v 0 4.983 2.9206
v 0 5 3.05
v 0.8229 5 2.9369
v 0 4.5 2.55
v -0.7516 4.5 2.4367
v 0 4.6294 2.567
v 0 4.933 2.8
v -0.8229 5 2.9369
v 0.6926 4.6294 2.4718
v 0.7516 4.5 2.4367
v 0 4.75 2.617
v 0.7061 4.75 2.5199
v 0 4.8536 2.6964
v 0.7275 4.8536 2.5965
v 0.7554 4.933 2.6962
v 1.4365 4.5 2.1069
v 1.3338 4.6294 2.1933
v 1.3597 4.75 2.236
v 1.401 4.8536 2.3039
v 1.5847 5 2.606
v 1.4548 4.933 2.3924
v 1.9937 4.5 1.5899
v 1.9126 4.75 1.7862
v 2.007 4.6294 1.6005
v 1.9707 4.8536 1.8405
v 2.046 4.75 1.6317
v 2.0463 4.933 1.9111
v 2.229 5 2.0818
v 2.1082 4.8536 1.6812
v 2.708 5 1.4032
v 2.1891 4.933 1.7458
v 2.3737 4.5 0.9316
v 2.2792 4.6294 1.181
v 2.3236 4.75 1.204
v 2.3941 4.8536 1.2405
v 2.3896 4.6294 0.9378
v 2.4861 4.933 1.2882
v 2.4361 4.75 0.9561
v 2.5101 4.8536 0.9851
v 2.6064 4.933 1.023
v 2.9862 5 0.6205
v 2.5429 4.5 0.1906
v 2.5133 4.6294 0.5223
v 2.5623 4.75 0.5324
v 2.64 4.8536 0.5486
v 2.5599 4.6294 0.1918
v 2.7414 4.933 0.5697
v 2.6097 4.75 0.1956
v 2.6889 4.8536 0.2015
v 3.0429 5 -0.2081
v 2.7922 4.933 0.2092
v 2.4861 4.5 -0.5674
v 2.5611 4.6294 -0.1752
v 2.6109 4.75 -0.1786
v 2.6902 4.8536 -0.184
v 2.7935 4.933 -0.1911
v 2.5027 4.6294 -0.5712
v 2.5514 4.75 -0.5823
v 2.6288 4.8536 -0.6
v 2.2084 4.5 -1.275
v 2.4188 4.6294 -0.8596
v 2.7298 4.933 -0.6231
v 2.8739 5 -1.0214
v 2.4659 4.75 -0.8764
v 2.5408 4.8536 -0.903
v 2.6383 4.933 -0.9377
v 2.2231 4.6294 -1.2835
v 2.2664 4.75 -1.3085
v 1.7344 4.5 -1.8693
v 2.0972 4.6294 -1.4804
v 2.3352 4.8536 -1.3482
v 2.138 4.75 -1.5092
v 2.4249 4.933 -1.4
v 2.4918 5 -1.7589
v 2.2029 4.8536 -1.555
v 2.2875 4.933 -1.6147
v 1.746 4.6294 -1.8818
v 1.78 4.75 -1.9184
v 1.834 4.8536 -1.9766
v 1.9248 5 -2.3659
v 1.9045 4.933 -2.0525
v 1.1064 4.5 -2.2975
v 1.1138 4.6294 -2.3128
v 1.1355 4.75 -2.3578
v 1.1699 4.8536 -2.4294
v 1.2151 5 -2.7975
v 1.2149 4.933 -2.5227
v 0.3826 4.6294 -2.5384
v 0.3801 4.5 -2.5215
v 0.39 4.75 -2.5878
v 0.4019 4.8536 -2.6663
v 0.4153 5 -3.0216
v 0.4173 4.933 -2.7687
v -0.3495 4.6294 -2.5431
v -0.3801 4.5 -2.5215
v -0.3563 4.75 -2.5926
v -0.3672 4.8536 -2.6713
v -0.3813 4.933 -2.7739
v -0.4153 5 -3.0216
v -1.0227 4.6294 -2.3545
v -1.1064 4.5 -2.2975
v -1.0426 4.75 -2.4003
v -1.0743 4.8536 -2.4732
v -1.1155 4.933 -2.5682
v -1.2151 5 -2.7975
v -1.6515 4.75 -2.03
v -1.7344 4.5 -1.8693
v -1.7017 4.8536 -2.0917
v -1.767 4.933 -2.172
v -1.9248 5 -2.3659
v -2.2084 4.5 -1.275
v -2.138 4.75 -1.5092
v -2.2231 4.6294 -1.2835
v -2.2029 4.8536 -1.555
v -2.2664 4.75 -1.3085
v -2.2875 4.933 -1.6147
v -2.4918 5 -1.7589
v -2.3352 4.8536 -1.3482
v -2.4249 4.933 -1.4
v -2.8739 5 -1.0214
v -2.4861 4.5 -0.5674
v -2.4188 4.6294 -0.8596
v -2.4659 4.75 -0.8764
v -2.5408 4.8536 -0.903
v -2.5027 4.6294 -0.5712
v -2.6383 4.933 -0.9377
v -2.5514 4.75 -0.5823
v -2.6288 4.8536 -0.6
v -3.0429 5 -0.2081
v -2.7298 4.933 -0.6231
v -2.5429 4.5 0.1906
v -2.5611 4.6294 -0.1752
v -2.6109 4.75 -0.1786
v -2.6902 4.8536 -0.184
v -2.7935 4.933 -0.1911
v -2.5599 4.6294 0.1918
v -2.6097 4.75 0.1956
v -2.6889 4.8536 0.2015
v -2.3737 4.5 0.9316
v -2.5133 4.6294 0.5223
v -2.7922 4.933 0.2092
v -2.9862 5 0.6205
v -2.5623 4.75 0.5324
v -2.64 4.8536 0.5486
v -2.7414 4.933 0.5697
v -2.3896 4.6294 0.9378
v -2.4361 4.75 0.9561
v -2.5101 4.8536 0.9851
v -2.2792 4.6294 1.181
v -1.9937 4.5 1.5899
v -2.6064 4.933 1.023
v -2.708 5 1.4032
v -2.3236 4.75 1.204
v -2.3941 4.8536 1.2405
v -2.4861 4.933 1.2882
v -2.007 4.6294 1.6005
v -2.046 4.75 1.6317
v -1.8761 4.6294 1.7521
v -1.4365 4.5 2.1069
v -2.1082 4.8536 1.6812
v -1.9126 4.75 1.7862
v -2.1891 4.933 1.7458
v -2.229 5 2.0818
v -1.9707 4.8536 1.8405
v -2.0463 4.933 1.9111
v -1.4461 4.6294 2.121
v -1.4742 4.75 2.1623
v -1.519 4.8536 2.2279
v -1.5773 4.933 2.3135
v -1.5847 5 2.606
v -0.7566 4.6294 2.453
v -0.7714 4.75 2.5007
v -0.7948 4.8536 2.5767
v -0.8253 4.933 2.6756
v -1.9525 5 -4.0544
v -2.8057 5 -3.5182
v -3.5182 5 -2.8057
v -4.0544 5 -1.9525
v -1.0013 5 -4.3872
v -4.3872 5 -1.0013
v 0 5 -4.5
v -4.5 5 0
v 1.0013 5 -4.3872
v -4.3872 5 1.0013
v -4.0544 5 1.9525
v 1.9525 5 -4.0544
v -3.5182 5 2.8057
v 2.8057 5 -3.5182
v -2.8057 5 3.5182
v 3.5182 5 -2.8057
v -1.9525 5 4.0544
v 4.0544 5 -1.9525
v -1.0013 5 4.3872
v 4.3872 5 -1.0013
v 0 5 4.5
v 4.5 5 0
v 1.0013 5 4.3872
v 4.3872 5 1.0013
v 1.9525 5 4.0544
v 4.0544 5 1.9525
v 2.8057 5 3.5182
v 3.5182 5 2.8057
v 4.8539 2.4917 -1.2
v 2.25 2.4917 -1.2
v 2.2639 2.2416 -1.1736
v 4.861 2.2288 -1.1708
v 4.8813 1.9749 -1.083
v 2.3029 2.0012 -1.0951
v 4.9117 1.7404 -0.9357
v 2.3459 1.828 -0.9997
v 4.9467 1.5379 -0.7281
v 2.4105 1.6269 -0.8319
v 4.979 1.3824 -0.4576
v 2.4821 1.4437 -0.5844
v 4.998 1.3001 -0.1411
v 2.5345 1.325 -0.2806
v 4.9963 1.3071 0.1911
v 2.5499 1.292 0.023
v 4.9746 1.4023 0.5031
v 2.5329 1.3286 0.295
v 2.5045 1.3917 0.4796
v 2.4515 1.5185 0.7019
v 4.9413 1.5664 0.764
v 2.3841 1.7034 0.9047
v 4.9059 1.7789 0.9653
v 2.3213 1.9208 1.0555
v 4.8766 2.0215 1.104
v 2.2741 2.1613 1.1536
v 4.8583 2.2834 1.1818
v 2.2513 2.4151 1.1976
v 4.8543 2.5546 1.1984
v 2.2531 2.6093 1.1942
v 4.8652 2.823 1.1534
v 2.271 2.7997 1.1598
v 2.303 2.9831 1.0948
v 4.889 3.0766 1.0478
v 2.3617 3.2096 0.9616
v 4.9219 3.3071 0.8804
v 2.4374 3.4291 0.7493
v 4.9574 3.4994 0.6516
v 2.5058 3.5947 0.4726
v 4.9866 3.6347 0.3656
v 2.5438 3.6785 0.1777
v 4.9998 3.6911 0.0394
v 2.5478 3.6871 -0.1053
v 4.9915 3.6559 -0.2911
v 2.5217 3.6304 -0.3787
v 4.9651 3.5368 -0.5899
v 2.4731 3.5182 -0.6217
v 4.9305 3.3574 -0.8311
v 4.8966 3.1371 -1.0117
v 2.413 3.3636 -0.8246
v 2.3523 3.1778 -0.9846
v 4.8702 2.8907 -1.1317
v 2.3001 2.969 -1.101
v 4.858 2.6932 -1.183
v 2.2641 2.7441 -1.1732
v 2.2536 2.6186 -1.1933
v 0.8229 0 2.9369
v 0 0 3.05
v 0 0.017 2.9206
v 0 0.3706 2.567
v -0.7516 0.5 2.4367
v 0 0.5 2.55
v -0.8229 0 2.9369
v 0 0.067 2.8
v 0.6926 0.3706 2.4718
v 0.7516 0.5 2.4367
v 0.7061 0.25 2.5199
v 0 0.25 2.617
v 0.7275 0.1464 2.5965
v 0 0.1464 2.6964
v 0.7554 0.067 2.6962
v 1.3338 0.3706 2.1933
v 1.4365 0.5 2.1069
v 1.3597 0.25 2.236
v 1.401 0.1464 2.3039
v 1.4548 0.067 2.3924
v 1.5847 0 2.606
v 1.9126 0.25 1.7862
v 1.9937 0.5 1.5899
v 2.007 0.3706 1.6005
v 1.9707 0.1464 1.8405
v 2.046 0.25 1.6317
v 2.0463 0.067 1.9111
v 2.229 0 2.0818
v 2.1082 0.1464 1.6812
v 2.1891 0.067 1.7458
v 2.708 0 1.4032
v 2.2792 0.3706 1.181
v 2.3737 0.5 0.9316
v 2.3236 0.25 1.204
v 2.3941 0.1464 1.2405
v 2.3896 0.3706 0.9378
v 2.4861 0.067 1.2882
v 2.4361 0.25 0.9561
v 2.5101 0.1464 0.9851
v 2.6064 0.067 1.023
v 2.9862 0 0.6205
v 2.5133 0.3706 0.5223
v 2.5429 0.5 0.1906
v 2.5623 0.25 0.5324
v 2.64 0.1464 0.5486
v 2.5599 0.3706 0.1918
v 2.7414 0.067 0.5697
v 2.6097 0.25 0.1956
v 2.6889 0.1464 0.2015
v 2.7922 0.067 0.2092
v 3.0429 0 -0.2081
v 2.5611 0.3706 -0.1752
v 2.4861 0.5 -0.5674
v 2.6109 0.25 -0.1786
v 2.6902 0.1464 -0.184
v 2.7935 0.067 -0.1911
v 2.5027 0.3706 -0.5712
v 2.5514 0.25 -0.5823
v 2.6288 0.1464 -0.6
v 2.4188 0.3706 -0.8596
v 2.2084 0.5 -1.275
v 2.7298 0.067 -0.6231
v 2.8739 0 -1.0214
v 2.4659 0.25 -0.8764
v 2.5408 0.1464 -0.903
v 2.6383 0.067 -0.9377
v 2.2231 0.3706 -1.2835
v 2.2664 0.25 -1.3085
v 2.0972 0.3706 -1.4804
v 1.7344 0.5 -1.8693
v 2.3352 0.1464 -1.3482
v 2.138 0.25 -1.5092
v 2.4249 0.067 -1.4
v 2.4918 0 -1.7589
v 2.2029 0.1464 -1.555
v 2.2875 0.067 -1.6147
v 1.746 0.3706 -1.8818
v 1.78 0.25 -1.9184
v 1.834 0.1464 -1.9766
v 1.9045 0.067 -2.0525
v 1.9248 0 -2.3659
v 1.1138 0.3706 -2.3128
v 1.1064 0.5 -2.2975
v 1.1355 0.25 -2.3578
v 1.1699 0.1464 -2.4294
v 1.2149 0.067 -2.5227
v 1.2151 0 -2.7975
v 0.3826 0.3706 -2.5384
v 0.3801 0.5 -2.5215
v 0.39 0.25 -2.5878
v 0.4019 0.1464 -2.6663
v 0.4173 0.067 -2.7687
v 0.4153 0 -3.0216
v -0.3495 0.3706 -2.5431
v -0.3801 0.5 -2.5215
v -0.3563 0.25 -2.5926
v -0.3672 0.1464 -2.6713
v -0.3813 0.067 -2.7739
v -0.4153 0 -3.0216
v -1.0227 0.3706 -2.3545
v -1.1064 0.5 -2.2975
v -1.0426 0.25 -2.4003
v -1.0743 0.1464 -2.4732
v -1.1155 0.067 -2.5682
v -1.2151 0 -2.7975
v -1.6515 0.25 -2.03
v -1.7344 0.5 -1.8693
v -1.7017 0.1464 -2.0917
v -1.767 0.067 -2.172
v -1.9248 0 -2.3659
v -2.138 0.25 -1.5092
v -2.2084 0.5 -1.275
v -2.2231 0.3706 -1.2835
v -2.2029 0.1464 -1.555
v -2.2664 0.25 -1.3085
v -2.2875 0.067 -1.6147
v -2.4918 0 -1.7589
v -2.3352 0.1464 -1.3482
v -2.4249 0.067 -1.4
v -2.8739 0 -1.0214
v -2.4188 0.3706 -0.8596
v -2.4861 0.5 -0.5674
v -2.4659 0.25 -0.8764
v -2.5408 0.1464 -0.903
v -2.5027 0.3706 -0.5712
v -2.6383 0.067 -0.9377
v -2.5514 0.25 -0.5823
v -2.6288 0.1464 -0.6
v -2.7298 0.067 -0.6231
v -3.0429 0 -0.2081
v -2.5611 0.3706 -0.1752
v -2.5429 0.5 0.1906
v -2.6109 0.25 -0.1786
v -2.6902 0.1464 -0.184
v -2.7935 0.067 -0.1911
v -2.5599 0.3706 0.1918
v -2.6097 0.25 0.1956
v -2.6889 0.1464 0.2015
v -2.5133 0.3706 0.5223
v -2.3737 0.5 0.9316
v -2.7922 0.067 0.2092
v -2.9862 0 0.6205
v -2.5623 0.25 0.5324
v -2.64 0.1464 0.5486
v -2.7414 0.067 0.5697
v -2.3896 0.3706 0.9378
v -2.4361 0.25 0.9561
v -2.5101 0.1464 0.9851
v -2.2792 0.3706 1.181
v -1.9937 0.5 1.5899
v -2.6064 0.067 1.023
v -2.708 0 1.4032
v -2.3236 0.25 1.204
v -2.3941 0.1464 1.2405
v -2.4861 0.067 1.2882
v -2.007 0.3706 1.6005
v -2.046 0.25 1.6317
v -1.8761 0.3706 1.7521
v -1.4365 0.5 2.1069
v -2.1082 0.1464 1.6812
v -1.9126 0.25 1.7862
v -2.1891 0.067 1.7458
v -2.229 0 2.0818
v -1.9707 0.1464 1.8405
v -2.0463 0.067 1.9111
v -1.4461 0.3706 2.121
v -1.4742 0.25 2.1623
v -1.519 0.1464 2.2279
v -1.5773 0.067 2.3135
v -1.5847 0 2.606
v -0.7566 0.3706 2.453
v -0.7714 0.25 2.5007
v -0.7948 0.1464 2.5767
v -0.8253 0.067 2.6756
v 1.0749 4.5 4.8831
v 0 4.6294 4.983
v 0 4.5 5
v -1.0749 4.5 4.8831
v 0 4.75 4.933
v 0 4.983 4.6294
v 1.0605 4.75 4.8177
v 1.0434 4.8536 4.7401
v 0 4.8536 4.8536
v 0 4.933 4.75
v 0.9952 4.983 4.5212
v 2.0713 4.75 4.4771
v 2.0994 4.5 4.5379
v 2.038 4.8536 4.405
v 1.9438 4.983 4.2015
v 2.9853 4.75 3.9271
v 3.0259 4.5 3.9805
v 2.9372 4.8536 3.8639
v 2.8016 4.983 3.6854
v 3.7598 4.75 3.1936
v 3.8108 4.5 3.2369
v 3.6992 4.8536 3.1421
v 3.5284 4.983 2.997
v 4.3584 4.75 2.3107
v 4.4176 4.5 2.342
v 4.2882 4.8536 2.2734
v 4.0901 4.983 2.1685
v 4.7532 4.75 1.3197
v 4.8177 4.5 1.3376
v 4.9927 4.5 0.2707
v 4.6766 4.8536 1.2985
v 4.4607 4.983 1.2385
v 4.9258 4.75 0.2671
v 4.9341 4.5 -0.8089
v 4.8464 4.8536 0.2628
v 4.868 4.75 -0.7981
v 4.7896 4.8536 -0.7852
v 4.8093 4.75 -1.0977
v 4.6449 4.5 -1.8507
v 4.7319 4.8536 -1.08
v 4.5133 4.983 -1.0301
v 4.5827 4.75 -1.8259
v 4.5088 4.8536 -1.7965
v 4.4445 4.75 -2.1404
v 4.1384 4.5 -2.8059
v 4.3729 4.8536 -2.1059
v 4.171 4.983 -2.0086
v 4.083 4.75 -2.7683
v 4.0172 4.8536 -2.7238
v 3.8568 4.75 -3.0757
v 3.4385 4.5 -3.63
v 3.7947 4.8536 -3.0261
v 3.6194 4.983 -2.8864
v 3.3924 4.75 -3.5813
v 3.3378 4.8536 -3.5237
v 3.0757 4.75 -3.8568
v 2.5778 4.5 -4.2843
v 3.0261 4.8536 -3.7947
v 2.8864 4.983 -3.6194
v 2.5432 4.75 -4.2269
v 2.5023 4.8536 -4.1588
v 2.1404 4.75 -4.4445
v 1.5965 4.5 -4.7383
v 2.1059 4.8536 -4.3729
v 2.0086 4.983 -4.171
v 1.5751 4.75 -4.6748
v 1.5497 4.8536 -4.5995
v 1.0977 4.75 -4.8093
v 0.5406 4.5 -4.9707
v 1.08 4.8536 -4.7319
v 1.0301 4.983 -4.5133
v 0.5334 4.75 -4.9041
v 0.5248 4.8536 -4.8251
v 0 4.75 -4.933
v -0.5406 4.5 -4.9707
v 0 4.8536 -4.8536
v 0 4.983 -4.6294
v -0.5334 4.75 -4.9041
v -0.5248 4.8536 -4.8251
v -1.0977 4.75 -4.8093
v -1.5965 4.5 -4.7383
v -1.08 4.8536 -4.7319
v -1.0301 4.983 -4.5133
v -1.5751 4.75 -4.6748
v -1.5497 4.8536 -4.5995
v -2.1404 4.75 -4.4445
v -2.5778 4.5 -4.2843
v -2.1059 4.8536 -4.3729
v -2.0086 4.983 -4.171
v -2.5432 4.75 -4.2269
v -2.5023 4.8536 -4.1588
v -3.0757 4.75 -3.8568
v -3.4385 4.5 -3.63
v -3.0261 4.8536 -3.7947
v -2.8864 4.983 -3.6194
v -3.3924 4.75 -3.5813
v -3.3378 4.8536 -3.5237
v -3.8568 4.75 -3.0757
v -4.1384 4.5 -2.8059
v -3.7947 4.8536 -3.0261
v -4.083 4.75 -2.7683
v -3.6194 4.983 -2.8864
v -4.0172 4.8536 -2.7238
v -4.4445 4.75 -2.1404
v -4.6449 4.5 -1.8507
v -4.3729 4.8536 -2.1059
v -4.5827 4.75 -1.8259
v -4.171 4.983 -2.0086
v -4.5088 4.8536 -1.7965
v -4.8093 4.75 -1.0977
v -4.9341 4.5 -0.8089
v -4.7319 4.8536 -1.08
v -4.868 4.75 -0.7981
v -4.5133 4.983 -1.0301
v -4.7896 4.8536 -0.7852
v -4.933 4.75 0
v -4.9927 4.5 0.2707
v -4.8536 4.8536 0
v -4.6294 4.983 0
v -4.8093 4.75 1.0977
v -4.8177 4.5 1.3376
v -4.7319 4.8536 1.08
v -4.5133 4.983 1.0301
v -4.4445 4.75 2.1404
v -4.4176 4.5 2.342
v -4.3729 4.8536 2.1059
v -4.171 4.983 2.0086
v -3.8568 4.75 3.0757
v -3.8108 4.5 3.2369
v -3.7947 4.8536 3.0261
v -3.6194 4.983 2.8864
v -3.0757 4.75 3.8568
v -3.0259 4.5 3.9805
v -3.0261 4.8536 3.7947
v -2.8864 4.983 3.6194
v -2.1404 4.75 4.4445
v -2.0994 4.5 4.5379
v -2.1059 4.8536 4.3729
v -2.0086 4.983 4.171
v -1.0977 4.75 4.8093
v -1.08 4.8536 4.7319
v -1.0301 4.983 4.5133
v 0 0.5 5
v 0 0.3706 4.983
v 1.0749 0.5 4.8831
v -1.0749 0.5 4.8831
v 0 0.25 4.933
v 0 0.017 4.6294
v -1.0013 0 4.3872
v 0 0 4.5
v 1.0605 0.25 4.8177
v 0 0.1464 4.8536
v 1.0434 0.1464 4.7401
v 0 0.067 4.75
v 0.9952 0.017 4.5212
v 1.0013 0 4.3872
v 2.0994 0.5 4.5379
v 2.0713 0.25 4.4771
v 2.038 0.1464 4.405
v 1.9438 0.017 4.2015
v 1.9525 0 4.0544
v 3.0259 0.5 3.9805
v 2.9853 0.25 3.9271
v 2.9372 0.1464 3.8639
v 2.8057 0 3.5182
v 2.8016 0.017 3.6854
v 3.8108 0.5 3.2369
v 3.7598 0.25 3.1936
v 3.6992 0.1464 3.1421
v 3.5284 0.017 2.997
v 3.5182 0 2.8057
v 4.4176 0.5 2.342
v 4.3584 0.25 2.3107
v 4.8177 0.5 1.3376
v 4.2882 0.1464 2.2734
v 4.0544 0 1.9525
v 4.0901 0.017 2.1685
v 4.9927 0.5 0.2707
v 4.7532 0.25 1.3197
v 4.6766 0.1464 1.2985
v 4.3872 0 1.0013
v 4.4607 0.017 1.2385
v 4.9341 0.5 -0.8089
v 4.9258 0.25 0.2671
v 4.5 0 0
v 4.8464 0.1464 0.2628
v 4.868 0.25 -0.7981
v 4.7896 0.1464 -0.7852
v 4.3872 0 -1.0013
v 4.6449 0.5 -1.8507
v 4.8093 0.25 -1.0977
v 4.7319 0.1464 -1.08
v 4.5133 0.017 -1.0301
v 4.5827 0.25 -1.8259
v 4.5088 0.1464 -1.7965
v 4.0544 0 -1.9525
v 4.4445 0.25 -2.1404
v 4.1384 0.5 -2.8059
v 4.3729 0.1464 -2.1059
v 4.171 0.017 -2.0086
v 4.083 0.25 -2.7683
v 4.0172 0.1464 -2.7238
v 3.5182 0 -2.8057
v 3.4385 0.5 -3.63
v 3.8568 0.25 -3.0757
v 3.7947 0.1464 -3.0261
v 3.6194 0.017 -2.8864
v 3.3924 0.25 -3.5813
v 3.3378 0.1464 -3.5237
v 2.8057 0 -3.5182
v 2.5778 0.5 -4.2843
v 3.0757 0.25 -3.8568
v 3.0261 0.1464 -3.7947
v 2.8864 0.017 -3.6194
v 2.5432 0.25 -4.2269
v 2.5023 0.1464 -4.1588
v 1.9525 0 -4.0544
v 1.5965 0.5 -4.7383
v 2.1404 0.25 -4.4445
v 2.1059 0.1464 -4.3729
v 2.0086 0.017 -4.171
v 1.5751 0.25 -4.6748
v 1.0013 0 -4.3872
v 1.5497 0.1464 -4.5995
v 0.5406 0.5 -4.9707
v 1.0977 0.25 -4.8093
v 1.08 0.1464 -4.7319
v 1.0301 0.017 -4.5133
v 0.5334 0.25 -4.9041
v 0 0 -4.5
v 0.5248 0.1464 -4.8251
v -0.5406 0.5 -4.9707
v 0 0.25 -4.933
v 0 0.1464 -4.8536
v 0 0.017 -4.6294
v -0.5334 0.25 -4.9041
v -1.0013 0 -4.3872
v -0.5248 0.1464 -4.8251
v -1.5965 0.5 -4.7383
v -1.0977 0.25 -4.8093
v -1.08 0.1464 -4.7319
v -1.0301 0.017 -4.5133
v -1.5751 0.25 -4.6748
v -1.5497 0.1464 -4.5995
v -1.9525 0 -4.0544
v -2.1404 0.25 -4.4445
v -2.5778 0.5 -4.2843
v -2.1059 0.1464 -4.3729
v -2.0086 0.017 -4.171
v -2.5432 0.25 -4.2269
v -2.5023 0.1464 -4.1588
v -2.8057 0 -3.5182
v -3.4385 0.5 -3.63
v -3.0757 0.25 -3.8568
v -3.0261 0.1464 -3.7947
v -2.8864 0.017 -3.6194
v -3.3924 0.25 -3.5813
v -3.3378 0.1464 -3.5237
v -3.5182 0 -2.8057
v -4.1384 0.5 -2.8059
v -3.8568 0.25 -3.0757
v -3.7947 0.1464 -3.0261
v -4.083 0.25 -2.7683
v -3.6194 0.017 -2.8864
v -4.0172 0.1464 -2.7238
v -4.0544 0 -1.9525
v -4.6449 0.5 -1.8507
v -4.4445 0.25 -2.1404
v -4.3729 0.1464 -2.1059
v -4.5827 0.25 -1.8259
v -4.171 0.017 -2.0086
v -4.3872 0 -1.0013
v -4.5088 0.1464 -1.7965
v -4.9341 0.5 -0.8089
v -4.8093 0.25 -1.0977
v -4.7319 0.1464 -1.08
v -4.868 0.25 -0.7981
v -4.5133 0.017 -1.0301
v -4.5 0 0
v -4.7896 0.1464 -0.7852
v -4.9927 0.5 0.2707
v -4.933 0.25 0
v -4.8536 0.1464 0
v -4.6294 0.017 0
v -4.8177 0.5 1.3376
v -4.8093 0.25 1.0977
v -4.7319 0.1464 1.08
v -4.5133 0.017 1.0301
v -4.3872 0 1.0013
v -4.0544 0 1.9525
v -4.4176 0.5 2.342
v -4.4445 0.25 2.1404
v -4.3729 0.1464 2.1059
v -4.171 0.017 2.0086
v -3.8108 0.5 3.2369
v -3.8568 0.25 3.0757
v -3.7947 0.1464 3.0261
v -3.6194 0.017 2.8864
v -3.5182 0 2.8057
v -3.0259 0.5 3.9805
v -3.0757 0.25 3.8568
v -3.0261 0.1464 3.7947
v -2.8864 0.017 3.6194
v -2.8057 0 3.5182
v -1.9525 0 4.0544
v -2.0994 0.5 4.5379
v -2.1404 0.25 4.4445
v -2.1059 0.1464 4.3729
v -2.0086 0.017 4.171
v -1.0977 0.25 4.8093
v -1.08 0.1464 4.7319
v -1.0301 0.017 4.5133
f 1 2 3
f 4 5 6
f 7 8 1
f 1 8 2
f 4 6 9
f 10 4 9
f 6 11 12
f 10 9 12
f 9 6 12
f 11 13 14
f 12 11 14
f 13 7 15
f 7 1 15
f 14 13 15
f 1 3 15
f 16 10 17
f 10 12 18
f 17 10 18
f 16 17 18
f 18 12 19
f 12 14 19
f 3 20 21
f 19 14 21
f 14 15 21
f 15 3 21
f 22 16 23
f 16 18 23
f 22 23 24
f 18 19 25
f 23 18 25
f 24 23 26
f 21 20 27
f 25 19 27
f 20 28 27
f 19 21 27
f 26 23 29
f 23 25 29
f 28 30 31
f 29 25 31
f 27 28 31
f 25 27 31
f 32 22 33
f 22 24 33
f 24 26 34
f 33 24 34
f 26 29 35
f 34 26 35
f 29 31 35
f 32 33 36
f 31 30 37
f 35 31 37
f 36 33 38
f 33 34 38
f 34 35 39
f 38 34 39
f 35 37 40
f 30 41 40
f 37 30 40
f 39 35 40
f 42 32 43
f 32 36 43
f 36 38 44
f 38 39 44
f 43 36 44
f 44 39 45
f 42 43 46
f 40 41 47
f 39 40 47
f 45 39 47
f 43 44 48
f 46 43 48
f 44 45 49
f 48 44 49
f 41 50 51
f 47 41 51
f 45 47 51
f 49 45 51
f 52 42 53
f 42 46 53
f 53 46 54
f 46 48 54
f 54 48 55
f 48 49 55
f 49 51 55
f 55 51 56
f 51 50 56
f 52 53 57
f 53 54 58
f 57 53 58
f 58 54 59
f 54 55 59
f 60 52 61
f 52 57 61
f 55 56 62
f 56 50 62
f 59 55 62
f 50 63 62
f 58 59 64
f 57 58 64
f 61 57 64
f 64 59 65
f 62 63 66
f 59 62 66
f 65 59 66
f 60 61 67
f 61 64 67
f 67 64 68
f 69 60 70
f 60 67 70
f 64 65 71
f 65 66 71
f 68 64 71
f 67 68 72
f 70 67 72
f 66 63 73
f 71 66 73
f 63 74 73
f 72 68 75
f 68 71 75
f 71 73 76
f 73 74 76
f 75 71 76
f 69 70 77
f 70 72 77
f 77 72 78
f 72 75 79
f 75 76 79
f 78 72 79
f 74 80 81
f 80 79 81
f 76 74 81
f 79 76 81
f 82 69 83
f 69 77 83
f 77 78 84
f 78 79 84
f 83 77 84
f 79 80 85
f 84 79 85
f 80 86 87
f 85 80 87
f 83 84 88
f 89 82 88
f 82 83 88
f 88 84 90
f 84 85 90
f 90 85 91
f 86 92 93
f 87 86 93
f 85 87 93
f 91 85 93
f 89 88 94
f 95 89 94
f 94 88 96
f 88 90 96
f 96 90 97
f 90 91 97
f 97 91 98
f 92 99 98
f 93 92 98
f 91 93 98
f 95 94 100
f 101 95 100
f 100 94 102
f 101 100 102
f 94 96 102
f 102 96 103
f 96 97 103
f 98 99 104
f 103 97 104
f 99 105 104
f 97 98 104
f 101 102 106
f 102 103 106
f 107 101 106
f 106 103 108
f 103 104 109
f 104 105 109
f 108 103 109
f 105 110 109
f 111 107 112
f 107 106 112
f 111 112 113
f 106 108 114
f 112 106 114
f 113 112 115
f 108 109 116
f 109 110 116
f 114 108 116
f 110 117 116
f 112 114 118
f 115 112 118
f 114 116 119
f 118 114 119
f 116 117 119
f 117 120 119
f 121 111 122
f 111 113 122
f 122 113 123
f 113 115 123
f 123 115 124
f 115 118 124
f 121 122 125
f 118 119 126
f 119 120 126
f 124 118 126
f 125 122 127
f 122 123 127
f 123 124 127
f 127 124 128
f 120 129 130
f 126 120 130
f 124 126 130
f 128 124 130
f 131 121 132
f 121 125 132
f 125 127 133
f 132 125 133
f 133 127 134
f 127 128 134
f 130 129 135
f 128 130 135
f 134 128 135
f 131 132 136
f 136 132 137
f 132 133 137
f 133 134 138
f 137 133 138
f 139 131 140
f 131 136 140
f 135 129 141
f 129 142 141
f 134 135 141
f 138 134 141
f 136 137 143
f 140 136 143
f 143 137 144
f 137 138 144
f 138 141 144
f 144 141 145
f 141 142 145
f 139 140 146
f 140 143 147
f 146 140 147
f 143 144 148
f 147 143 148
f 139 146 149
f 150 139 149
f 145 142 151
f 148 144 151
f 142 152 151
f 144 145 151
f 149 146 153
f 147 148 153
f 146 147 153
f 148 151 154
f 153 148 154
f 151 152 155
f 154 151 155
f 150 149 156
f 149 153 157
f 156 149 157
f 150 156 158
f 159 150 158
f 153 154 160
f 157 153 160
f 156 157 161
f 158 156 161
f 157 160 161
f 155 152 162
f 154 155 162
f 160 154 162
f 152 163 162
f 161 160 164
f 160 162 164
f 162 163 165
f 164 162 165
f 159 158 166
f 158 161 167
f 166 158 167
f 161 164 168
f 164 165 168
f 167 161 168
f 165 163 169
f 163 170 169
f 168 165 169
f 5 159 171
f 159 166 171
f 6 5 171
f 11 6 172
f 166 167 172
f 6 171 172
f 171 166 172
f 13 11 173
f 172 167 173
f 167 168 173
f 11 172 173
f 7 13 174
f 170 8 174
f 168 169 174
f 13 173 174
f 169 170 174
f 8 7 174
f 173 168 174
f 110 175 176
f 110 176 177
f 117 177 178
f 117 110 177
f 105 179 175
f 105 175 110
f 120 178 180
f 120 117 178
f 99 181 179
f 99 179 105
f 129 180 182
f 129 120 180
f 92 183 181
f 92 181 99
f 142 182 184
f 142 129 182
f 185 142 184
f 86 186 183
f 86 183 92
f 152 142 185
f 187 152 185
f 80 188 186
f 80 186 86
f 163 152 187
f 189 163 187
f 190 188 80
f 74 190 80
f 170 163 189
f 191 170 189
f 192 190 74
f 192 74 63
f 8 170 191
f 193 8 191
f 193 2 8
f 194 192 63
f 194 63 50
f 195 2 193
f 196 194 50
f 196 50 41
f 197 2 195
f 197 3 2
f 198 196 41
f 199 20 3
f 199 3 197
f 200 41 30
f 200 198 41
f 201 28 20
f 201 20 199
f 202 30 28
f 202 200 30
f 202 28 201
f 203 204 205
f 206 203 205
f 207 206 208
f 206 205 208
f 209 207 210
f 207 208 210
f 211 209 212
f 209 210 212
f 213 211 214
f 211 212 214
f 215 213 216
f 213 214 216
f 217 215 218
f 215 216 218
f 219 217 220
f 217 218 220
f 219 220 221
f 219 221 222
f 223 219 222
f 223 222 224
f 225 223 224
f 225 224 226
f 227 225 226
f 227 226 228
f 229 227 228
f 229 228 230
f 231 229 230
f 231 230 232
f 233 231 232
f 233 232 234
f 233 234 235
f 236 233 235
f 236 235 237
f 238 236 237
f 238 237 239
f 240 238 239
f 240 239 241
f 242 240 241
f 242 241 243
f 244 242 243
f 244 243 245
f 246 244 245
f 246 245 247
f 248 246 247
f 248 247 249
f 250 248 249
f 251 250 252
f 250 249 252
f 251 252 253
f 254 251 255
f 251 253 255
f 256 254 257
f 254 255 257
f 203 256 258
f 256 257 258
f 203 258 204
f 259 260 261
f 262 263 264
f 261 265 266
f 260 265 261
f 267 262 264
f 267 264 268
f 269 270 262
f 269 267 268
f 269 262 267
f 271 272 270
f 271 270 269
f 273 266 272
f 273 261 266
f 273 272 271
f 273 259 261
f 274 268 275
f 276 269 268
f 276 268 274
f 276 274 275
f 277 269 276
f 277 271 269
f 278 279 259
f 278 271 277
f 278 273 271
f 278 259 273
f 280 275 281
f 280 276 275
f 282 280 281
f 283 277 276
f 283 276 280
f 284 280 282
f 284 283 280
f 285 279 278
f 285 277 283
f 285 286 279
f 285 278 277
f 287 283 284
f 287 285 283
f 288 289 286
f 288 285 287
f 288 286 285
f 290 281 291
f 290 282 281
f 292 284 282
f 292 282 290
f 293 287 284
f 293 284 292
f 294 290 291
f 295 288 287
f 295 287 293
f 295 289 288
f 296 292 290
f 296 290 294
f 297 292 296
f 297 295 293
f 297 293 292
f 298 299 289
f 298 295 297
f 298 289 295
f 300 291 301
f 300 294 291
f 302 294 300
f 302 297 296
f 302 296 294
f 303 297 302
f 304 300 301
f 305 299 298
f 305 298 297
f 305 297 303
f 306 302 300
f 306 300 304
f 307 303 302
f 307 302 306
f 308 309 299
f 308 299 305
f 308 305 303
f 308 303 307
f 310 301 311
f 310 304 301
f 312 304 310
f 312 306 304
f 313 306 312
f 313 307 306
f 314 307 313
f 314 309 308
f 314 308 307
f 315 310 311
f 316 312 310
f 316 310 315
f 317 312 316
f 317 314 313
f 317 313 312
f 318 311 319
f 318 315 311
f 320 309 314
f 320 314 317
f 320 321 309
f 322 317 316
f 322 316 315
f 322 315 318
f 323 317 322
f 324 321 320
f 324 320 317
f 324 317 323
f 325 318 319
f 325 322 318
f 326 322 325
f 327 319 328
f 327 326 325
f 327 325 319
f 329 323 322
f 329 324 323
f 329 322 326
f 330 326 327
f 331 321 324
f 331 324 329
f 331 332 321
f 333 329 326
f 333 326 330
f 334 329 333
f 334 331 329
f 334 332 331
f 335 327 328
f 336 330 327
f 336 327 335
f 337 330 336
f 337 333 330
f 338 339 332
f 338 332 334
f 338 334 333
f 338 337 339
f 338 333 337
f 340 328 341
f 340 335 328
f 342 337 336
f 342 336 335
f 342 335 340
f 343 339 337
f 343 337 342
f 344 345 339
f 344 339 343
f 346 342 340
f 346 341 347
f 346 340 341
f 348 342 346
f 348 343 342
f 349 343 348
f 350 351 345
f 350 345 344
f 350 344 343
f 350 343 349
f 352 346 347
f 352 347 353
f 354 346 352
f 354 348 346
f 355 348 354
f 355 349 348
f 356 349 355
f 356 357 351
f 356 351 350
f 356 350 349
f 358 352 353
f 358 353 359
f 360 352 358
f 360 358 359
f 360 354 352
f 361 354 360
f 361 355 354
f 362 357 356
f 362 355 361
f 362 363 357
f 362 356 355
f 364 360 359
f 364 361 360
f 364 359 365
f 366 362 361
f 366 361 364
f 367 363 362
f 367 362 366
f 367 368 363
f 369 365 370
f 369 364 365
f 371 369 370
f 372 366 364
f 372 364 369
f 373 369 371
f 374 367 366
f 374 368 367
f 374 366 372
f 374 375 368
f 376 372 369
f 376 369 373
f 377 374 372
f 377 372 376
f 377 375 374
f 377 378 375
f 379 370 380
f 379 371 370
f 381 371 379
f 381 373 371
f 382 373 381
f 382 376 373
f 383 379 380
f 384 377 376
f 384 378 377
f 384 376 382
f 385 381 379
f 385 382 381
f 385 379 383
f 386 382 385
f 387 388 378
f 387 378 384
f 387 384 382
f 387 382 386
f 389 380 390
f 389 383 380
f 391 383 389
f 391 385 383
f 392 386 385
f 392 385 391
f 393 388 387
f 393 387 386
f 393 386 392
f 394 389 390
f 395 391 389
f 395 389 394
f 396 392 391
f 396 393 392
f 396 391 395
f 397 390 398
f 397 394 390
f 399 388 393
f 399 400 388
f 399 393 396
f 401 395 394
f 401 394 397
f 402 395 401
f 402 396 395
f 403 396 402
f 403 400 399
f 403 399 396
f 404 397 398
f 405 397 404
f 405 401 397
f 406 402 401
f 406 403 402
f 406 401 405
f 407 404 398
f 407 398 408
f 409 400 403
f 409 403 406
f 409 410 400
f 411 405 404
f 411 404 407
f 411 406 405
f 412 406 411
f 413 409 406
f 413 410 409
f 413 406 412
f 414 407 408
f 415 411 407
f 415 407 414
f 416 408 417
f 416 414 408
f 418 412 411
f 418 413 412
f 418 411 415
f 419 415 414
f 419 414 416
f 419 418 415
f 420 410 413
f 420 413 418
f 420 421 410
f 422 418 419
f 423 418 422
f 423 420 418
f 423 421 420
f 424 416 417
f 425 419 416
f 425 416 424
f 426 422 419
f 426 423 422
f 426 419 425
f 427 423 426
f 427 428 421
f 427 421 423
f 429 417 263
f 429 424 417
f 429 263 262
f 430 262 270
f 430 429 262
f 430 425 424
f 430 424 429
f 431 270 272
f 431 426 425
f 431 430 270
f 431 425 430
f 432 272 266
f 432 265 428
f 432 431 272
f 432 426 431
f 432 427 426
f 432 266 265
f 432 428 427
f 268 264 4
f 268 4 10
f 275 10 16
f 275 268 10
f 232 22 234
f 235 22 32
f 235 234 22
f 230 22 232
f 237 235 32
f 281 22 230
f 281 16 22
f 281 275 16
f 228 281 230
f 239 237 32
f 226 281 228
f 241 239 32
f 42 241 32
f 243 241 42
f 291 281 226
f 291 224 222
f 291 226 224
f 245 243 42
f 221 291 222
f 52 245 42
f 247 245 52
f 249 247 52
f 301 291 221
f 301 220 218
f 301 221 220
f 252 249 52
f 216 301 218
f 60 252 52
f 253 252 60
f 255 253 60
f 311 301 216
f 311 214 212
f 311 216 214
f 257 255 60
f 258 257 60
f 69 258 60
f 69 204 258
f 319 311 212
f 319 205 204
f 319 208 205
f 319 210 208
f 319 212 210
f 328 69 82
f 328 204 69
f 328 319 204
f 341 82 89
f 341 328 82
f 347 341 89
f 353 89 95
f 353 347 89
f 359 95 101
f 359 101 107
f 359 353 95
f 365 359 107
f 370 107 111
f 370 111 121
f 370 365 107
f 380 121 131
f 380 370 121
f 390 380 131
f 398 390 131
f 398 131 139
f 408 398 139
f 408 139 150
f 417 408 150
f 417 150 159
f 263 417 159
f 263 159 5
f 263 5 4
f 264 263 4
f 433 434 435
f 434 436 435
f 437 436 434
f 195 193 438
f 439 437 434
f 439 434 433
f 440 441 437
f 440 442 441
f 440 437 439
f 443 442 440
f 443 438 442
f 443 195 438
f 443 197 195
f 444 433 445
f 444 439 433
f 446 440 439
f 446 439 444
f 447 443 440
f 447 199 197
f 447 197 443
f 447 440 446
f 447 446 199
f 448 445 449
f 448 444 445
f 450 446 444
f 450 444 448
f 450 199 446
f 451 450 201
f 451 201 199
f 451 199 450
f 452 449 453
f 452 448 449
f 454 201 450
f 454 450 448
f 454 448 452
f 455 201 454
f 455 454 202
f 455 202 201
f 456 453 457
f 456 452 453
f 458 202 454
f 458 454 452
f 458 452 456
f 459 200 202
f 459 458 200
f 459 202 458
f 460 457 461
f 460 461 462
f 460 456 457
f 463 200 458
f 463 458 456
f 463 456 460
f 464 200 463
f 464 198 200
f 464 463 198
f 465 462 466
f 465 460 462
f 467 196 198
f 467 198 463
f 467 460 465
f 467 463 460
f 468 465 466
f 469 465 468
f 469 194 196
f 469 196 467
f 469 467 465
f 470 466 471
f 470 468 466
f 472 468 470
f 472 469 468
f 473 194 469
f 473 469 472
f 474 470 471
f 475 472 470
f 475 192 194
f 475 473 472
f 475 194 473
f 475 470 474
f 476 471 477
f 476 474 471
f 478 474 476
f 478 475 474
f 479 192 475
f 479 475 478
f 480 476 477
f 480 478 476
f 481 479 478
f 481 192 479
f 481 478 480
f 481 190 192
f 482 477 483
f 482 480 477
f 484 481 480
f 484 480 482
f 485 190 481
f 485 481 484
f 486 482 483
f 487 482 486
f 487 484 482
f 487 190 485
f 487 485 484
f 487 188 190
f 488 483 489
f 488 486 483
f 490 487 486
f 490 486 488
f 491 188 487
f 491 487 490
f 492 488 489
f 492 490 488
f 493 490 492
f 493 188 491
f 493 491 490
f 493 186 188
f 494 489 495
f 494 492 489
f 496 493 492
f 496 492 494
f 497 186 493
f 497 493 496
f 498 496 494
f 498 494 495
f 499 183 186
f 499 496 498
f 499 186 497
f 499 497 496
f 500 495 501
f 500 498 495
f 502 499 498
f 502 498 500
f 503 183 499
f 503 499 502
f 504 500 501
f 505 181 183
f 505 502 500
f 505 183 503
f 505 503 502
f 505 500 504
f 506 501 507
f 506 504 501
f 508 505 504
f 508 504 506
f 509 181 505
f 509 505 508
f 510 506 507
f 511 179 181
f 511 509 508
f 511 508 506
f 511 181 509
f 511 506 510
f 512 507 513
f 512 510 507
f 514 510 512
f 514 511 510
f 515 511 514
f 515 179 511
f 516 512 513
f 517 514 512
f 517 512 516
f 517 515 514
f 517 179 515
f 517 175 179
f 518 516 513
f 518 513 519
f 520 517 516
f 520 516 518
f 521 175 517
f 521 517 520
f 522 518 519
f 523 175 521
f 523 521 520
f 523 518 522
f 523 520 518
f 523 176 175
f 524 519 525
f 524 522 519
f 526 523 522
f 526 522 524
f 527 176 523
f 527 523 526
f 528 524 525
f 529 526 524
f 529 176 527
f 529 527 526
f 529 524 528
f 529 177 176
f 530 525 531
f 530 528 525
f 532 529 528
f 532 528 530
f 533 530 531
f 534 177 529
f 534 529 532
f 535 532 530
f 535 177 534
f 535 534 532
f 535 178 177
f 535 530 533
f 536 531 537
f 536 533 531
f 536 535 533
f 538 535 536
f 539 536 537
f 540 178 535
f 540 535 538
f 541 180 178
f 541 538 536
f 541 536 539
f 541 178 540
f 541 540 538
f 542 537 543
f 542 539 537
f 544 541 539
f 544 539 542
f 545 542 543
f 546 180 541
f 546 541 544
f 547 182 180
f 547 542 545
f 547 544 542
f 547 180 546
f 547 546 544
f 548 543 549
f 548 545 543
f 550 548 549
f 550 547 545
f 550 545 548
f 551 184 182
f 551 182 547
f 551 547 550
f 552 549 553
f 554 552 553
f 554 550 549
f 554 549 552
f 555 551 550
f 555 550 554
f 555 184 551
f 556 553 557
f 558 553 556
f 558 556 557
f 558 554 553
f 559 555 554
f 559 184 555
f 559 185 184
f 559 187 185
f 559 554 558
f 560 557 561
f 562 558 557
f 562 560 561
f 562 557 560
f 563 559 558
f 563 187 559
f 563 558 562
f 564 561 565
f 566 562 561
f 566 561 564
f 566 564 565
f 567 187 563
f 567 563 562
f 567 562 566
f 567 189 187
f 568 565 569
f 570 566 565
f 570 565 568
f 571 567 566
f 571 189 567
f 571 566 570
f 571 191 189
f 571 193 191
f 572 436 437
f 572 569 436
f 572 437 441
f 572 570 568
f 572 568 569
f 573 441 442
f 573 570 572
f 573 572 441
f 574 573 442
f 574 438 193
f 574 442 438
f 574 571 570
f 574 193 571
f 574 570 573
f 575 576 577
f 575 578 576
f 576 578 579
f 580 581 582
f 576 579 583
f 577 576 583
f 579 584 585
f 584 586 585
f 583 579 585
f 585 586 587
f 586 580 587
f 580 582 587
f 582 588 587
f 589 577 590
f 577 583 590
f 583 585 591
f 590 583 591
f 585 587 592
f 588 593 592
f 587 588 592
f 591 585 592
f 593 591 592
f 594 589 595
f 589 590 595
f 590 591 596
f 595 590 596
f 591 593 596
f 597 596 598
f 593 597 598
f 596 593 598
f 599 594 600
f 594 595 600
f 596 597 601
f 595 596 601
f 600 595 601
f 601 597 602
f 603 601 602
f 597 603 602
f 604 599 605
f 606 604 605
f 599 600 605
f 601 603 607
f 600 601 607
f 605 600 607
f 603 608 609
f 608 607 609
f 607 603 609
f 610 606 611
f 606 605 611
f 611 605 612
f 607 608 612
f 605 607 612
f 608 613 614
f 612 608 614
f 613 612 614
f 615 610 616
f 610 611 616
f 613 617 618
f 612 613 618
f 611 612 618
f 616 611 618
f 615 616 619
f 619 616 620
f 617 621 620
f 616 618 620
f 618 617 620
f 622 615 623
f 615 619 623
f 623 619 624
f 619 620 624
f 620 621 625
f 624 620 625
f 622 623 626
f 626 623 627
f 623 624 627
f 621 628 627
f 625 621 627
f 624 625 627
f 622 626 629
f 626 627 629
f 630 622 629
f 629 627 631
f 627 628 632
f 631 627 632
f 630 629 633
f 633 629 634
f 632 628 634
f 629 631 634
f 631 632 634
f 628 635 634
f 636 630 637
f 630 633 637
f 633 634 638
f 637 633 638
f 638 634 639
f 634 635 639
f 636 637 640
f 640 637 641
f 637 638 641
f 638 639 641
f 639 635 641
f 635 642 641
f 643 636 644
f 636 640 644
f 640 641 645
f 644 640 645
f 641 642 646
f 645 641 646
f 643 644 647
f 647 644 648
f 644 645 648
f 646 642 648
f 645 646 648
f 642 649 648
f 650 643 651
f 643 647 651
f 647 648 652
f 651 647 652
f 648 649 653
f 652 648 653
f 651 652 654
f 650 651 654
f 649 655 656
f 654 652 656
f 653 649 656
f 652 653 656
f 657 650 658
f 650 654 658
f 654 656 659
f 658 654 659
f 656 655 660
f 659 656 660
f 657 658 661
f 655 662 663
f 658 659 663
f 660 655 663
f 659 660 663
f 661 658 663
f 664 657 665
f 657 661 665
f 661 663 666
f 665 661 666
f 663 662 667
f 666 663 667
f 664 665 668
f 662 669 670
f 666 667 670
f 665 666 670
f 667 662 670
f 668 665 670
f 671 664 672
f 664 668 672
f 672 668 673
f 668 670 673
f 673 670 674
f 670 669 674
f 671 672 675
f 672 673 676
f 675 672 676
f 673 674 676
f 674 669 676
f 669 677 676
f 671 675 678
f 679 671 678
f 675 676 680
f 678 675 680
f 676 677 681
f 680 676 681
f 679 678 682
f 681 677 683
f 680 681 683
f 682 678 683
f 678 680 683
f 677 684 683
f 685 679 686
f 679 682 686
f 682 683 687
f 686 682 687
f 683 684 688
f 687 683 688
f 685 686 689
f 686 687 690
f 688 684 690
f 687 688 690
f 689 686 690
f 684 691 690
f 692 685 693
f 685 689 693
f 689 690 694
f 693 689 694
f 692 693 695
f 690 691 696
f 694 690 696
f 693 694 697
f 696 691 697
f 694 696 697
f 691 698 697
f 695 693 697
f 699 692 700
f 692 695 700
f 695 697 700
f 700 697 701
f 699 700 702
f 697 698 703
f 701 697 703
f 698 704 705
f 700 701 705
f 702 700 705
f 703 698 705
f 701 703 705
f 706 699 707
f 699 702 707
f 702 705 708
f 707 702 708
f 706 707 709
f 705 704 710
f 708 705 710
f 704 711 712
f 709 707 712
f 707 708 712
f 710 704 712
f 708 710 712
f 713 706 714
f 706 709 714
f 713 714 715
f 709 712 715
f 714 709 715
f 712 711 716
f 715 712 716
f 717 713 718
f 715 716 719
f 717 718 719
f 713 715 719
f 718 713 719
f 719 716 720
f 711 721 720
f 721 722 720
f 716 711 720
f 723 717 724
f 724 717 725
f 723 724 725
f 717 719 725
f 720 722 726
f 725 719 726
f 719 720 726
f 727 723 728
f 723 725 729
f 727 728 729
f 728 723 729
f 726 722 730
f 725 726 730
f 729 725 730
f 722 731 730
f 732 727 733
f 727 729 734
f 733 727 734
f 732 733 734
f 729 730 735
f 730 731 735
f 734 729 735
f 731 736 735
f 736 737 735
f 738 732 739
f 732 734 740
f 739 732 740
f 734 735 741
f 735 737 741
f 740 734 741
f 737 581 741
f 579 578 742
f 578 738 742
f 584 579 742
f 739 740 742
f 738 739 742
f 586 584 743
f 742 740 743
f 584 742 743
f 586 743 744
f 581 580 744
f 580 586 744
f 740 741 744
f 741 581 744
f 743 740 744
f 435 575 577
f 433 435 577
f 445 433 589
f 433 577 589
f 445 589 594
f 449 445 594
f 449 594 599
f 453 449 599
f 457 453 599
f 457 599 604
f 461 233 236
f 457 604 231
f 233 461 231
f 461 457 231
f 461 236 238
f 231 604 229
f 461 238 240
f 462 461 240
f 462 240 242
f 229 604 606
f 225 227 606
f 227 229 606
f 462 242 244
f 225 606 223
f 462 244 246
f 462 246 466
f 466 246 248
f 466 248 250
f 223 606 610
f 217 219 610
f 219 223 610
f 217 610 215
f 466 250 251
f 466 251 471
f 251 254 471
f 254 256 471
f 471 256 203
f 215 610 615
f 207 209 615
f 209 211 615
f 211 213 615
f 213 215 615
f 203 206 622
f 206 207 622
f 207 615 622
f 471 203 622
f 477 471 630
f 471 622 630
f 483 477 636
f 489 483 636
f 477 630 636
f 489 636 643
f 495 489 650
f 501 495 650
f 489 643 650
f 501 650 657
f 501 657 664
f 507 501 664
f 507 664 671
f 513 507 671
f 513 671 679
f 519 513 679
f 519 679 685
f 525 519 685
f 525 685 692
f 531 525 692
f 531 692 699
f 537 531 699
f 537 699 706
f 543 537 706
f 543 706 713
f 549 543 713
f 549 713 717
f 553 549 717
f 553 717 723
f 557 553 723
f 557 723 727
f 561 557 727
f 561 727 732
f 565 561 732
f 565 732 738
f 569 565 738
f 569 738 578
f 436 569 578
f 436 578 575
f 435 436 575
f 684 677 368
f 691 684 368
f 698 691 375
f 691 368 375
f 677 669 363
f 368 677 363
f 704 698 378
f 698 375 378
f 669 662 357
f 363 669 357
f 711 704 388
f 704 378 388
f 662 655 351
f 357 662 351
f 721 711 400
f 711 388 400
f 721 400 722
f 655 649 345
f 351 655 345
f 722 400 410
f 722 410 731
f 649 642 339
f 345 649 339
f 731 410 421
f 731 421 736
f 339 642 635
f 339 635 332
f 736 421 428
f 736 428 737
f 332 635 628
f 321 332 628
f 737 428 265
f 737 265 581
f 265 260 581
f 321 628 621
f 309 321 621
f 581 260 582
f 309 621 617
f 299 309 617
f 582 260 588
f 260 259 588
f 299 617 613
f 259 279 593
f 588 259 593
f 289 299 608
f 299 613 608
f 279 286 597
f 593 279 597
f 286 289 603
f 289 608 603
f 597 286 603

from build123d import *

# Parameters (mm, degrees)
SKETCH1_R                 = 5
SKETCH1_R_2               = 2.55
BOSS_EXTRUDE1_DEPTH       = 5
FILLET1_R                 = 0.5
F_2_5MM_DOWEL_HOLE1_D     = 2.4
F_2_5MM_DOWEL_HOLE1_DEPTH = 5
F_2_5MM_DOWEL_HOLE1_TIP   = 0.721032743


with BuildPart() as part:
    # Sketch1 → Boss-Extrude1 (new body)
    with BuildSketch(Plane(origin=(0, 0, 0), x_dir=(1, 0, 0), z_dir=(0, 1, 0))):
        with Locations(Location((0, 0, 0), (0, 0, 270))):
            Circle(SKETCH1_R)
        with Locations(Location((0, 0, 0), (0, 0, 270))):
            Circle(SKETCH1_R_2, mode=Mode.SUBTRACT)
    extrude(amount=BOSS_EXTRUDE1_DEPTH)

    # Fillet1
    fillet1_edges = [part.edges().sort_by_distance(p)[0] for p in [
        (0, 0, -5),
        (0, 5, -5),
        (0, 0, -2.55),
        (0, 5, -2.55),
    ]]
    fillet(fillet1_edges, radius=FILLET1_R)

    # Ø2.5mm Dowel Hole1
    with Locations(Plane(origin=(5, 2.491746689, 0), x_dir=(0, 0, 1), z_dir=(1, 0, 0))):
        with Locations((0, 0)):
            Hole(F_2_5MM_DOWEL_HOLE1_D / 2, depth=F_2_5MM_DOWEL_HOLE1_DEPTH)
            with Locations((0, 0, -(F_2_5MM_DOWEL_HOLE1_DEPTH + F_2_5MM_DOWEL_HOLE1_TIP / 2))):  # 118° drill point
                Cone(0, F_2_5MM_DOWEL_HOLE1_D / 2, F_2_5MM_DOWEL_HOLE1_TIP, mode=Mode.SUBTRACT)


solid = part.part
